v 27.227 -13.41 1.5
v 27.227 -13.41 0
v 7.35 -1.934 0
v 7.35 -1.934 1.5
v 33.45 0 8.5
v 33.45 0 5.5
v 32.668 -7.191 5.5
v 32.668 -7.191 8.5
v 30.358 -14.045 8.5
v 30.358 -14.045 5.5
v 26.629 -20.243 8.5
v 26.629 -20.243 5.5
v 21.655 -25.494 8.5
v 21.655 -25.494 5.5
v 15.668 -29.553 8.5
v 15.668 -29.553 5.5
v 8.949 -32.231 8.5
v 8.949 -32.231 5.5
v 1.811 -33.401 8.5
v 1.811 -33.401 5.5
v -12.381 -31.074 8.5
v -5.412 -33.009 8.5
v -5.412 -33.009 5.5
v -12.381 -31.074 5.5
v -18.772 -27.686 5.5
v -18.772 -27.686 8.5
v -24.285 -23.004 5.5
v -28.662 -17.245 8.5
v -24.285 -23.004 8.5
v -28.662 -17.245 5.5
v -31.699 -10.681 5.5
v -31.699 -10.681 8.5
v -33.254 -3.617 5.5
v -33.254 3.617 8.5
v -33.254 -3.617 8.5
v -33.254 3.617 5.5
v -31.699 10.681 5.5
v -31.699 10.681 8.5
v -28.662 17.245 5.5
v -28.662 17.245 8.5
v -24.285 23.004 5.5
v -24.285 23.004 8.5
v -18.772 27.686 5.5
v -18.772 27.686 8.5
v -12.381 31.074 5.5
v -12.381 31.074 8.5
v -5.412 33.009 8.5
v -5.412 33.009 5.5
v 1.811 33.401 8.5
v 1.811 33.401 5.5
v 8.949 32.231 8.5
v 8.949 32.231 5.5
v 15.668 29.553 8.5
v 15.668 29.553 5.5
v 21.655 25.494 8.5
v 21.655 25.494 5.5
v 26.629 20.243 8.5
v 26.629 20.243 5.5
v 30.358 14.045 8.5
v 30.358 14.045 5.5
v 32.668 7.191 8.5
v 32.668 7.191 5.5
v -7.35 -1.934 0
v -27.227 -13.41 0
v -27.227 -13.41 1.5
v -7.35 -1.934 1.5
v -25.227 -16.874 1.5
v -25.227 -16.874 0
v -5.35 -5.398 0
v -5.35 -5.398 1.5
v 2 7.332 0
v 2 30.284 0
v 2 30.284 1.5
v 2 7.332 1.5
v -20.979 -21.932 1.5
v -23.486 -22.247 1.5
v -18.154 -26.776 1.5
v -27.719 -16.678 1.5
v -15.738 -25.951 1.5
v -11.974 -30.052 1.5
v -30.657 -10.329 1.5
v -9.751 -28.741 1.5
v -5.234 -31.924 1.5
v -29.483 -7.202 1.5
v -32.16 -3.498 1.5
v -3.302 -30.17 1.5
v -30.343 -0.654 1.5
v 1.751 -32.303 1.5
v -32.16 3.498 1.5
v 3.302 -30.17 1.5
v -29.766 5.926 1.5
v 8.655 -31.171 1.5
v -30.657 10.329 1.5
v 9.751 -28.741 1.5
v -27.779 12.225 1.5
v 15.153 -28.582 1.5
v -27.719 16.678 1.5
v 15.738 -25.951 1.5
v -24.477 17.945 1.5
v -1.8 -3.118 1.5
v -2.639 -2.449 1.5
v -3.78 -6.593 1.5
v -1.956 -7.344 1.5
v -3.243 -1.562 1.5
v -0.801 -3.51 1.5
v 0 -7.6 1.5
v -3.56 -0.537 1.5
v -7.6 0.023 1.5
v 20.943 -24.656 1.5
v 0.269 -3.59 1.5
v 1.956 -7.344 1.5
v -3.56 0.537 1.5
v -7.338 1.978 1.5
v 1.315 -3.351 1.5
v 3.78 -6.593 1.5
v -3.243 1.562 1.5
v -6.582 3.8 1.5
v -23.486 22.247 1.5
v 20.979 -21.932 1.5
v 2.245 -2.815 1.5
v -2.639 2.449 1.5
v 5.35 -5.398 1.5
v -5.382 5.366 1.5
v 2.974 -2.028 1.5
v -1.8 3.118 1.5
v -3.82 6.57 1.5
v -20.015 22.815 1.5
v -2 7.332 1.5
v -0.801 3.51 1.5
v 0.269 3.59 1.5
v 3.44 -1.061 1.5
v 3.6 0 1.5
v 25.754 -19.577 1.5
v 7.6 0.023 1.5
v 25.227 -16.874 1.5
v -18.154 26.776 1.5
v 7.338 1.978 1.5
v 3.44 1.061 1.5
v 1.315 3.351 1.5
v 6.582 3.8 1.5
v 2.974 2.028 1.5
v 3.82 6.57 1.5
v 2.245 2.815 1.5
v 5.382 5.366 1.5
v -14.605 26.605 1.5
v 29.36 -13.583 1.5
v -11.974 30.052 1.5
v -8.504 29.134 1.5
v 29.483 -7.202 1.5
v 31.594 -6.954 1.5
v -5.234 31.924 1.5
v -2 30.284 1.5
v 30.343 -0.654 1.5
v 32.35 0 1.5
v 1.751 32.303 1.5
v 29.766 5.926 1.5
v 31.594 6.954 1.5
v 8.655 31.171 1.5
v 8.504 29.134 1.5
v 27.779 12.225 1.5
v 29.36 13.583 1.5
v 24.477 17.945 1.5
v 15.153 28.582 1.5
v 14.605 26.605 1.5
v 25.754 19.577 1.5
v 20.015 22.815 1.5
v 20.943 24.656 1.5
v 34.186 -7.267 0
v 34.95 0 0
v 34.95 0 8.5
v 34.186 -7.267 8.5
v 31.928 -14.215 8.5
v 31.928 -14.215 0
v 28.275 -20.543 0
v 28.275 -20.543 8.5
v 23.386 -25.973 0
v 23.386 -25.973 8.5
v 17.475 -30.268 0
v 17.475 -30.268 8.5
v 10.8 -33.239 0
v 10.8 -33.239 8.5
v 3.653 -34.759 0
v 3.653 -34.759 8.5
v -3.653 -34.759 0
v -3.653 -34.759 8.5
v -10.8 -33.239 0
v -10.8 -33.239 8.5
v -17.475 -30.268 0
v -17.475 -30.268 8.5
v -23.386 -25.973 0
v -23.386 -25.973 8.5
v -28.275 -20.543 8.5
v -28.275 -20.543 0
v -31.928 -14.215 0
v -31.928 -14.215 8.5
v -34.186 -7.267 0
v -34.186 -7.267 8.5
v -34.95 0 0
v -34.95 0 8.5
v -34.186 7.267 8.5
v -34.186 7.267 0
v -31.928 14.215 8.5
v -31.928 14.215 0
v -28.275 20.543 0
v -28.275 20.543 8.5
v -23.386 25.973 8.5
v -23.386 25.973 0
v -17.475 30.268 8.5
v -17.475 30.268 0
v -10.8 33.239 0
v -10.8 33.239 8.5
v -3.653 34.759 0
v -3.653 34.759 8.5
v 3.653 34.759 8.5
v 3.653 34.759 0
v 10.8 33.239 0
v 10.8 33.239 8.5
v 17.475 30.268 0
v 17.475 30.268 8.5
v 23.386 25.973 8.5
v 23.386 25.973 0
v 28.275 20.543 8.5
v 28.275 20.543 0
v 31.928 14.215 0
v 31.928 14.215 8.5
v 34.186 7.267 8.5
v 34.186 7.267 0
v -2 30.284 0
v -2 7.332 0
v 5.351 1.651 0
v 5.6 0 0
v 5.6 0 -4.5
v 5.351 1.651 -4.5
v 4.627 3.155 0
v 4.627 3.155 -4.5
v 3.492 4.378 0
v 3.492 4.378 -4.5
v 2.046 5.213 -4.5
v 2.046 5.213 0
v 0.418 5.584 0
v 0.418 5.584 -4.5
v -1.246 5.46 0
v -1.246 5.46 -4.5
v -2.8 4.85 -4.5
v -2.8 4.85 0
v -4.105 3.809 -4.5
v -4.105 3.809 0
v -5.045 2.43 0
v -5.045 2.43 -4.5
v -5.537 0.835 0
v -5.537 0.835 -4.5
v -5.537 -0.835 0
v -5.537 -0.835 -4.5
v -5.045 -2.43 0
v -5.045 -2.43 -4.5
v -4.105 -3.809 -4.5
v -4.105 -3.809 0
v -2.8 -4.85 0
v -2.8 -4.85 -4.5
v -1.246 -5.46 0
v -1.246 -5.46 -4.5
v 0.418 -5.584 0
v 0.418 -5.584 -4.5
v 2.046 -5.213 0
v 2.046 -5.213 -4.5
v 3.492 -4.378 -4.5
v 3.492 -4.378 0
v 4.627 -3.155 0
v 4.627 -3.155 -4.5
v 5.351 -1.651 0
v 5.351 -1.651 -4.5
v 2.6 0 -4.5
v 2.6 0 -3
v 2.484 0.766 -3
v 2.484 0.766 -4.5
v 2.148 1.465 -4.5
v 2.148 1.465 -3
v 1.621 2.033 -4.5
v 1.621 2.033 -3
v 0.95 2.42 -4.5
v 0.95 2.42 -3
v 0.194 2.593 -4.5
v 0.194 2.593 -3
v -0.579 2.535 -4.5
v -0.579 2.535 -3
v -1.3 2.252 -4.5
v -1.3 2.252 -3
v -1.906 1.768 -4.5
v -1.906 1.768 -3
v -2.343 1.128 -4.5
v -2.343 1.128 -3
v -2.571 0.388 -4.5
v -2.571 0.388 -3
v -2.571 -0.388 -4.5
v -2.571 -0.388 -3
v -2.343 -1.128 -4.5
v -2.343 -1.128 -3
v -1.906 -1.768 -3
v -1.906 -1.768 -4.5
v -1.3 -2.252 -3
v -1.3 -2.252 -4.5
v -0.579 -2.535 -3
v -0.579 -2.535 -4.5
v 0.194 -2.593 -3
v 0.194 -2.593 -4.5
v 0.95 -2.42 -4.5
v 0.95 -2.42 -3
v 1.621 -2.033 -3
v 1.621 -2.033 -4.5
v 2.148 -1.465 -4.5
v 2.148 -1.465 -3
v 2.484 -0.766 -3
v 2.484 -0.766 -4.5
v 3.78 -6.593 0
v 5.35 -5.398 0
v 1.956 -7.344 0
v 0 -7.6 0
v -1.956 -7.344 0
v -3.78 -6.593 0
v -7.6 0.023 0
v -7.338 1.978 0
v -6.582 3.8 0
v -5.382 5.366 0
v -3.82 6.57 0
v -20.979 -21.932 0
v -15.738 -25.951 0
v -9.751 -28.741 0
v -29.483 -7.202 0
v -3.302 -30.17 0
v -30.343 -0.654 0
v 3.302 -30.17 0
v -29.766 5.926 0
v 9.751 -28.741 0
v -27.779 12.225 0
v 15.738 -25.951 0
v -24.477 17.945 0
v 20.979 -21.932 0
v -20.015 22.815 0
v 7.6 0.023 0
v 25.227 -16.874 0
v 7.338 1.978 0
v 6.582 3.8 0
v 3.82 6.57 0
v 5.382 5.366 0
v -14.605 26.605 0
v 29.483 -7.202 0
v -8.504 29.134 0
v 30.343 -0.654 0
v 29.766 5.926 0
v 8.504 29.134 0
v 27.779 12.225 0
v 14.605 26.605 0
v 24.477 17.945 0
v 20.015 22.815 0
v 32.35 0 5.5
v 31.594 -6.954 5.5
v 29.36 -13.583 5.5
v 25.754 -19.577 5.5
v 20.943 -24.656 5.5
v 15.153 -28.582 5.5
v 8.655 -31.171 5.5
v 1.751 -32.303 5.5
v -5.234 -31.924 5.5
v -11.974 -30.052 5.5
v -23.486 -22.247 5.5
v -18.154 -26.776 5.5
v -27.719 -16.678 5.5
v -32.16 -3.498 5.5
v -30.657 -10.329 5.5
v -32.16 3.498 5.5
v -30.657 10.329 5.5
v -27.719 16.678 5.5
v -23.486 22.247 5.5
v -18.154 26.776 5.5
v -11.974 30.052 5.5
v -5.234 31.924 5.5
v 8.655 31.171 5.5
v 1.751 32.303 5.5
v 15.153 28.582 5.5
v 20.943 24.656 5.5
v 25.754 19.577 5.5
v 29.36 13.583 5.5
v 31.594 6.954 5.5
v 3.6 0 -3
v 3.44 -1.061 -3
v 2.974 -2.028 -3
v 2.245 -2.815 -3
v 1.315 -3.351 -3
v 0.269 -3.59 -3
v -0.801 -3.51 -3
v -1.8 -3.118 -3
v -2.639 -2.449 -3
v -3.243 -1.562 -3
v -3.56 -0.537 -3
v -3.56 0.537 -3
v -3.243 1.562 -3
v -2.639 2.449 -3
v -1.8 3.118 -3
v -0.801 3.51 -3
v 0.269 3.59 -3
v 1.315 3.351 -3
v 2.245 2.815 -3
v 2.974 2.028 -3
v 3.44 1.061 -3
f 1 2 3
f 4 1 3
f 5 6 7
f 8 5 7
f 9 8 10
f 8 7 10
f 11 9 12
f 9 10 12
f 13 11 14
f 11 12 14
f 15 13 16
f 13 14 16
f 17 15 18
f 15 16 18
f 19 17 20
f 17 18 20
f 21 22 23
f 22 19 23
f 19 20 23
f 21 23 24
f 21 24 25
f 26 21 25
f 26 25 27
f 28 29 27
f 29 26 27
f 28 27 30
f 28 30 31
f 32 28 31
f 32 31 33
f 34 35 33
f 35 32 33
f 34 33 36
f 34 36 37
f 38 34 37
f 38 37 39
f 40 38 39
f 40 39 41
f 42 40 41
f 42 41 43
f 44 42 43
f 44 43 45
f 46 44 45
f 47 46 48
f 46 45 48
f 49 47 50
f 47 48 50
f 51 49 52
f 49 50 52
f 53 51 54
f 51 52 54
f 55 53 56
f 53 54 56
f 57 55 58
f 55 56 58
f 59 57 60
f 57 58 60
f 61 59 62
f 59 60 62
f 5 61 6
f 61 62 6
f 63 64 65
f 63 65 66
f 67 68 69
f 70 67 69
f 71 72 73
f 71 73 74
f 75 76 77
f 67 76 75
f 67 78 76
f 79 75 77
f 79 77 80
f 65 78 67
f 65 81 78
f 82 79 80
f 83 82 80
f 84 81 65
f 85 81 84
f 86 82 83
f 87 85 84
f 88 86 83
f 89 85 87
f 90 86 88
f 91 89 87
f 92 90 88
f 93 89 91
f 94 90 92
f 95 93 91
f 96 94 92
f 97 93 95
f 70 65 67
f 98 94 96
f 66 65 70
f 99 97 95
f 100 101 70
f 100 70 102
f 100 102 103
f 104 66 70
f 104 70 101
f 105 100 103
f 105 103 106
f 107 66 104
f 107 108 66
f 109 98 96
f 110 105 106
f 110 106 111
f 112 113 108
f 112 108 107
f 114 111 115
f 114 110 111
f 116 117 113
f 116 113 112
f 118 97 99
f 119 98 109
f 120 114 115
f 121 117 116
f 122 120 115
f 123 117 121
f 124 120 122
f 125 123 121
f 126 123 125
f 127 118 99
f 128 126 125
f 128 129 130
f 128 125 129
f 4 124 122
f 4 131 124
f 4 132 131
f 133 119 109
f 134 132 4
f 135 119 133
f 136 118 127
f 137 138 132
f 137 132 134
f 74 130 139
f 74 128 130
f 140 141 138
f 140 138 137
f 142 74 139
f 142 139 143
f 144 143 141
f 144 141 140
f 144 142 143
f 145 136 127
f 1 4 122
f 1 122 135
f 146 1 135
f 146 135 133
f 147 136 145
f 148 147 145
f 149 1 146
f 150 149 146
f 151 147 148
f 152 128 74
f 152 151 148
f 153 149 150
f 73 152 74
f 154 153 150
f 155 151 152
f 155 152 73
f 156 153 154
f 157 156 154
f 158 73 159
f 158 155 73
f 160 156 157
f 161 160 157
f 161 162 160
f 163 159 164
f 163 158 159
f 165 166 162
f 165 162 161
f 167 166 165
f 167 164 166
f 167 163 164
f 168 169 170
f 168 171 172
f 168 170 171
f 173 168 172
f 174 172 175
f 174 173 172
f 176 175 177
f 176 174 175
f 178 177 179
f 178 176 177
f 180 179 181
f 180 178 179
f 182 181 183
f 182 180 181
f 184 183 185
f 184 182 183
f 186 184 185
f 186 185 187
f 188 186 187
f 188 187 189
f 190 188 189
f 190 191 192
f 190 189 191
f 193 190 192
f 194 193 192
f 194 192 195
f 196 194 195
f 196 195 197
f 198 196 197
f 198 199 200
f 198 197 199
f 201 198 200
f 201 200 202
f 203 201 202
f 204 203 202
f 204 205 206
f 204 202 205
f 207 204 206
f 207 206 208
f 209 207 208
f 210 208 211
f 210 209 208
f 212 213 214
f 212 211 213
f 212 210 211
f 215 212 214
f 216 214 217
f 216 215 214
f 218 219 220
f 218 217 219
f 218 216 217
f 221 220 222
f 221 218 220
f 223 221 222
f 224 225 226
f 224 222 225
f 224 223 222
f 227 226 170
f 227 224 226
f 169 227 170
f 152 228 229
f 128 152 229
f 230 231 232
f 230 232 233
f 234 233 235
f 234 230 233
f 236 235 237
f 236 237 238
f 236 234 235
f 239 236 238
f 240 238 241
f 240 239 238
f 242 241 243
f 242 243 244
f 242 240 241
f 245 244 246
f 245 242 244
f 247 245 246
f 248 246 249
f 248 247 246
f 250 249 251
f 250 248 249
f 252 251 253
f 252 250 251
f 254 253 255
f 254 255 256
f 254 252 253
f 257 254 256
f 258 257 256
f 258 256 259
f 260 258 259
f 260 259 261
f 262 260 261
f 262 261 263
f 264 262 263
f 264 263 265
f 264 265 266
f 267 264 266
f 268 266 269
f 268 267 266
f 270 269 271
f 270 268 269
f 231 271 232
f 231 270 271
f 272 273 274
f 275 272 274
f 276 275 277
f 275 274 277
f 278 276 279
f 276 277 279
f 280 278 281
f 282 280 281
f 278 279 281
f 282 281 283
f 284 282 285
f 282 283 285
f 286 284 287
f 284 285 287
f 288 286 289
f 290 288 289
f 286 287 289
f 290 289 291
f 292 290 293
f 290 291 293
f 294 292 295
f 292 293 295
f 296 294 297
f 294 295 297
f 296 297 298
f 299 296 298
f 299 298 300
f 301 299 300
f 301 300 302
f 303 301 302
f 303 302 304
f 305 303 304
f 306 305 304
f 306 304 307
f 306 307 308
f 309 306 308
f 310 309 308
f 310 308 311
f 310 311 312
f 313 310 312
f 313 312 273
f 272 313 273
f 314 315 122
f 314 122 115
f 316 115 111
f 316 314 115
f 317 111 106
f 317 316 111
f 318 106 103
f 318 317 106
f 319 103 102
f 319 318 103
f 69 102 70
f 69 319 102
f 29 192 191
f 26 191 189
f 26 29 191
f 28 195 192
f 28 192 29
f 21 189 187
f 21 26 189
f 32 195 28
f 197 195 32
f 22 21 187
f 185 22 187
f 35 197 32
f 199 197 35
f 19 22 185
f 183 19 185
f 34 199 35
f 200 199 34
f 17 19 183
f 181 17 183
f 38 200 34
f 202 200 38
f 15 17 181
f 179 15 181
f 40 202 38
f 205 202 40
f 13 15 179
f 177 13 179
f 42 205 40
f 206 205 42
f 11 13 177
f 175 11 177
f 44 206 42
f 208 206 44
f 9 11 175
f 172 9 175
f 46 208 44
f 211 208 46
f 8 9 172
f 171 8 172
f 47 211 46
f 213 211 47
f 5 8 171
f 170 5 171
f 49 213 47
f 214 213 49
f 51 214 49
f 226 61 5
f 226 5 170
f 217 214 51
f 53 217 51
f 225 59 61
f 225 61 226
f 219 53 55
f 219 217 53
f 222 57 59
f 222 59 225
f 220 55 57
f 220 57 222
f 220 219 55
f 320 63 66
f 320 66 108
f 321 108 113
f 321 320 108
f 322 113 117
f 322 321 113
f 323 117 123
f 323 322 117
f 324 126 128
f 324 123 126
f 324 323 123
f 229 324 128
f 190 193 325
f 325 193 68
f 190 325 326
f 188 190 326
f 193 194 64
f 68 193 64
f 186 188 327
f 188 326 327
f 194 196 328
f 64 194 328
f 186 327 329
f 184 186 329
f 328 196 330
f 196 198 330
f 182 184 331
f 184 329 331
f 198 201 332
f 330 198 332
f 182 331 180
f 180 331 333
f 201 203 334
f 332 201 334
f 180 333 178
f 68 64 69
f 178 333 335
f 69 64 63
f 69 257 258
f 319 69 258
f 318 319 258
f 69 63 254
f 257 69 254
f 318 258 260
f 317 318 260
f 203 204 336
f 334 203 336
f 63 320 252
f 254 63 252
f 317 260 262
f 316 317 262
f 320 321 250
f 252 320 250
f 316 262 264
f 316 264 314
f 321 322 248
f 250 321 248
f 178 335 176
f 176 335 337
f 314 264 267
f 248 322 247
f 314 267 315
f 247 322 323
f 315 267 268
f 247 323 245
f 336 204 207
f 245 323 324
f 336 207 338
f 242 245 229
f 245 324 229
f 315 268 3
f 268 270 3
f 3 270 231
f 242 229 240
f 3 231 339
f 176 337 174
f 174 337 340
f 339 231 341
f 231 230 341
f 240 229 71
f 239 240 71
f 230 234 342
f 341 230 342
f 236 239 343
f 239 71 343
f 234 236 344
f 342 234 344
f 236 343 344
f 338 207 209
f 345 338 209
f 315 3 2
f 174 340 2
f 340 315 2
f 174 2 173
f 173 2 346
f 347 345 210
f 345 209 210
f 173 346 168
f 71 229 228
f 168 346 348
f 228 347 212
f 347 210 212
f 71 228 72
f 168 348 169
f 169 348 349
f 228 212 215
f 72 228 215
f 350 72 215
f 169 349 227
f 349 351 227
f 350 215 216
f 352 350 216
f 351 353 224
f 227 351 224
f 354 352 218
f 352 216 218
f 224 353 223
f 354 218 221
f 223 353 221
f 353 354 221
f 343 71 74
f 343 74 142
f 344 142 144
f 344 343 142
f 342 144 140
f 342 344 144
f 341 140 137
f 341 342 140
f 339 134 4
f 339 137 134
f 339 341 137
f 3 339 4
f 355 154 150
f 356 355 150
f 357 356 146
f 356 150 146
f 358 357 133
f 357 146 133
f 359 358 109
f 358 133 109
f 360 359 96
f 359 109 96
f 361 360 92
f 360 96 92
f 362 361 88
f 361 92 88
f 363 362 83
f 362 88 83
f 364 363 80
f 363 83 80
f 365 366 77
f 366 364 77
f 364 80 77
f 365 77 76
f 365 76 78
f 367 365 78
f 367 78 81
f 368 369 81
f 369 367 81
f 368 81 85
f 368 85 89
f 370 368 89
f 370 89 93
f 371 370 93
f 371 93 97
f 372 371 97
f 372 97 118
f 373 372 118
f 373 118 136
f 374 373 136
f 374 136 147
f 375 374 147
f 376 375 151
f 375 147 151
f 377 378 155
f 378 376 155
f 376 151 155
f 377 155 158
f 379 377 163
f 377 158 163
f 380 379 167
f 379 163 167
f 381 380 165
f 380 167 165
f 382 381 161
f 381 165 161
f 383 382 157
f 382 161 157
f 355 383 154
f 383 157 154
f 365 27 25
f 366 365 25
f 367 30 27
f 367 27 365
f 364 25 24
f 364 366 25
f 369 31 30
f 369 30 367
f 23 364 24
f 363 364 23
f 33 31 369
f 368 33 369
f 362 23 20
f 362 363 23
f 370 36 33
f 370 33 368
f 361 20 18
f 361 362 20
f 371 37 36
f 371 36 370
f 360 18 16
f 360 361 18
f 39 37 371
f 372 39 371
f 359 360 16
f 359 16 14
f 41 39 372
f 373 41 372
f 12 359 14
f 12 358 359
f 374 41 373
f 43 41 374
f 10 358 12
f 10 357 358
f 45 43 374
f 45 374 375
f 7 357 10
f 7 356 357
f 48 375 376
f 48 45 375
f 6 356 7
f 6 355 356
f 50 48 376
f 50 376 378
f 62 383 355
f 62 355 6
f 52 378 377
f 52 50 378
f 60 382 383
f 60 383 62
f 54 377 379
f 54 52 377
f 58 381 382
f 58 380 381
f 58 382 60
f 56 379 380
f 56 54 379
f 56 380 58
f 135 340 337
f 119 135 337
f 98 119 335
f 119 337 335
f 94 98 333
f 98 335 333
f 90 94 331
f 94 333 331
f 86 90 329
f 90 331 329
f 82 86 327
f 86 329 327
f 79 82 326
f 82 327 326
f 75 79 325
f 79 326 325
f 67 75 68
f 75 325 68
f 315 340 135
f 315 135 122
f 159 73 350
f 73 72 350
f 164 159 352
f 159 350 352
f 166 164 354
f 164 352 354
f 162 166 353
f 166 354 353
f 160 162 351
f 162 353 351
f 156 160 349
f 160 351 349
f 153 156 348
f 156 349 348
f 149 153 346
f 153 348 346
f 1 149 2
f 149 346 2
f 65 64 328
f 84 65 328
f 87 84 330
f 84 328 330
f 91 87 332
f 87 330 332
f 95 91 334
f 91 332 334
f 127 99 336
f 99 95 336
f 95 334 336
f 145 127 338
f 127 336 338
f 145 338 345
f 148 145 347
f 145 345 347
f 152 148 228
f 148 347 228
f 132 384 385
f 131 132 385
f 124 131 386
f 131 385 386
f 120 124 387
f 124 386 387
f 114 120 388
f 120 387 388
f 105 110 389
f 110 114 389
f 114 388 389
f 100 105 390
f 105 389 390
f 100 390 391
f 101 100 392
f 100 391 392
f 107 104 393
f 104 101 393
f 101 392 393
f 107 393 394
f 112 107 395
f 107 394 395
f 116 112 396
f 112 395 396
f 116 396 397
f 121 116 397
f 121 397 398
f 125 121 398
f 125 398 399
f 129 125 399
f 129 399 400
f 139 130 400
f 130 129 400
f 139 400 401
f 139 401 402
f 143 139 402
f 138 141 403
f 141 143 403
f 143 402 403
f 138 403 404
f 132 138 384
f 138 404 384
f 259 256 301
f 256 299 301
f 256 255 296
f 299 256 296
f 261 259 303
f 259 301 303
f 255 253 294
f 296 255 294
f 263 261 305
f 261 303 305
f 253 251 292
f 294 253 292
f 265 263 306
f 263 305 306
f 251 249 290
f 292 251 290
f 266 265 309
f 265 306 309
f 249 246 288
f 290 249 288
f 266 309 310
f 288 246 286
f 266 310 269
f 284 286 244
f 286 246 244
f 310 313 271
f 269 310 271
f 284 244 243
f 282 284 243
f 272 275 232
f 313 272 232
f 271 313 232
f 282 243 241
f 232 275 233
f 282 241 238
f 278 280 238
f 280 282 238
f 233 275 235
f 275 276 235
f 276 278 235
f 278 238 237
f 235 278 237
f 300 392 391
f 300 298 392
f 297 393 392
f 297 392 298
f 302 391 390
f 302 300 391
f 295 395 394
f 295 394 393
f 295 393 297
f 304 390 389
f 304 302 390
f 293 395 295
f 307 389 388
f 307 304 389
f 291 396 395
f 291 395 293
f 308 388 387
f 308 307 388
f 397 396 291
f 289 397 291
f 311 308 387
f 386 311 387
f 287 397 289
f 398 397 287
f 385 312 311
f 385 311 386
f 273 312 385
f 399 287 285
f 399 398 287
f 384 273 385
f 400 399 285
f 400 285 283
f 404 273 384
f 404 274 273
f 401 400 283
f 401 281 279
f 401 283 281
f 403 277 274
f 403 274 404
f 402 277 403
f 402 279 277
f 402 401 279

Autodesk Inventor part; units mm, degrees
ref_plane "YZ Plane" through (0, 0, 0) normal (1, 0, 0) x (0, 1, 0)
ref_plane "XZ Plane" through (0, 0, 0) normal (0, 1, 0) x (-1, 0, 0)
ref_plane "XY Plane" through (0, 0, 0) normal (0, 0, 1) x (1, 0, 0)
sketch "Skizze1" plane through (0, 0, 0) normal (0, 0, 1) x (1, 0, 0)
  circle A0 centre (0, 0) radius 33.35 construction
  circle A1 centre (0, 0) radius 34.95
  circle A2 centre (0, 0) radius 3.6
  circle A3 centre (0, 0) radius 5.6
  circle A4 centre (0, 0) radius 33.45
  circle A5 centre (0, 0) radius 2.6
  line L0 (0, 51.4164) -> (0, -49.3444) construction
  line L1 (-54.4561, 0) -> (54.4561, 0) construction
  line L2 (-2, 30.284) -> (-2, 7.3321)
  line L3 (0, 0) -> (-28.9685, 16.725) construction
  line L4 (-27.2267, -13.41) -> (-7.3498, -1.934)
  arc A6 (-2, 7.3321) -> (-7.3498, -1.934) centre (0, 0) ccw
  arc A7 (-2, 30.284) -> (-27.2267, -13.41) centre (0, 0) ccw
  line L5 (25.2267, -16.8741) -> (5.3498, -5.3981)
  arc A8 (-25.2267, -16.8741) -> (25.2267, -16.8741) centre (0, 0) ccw
  line L6 (-25.2267, -16.8741) -> (-5.3498, -5.3981)
  arc A9 (-5.3498, -5.3981) -> (5.3498, -5.3981) centre (0, 0) ccw
  line L7 (2, 30.284) -> (2, 7.3321)
  arc A10 (27.2267, -13.41) -> (2, 30.284) centre (0, 0) ccw
  line L8 (27.2267, -13.41) -> (7.3498, -1.934)
  arc A11 (7.3498, -1.934) -> (2, 7.3321) centre (0, 0) ccw
  circle A12 centre (0, 0) radius 32.35
  dimension "d1" = 33.35
  dimension "d2" = 7.2
  dimension "d3" = 2
  dimension "d4" = 0.1
  dimension "d5" = 1.5
  dimension "d12" = 1
  dimension "d17" = 60
  dimension "d18" = 2
  dimension "d19" = 3
  dimension "d20" = 2
  dimension "d23" = 360
  dimension "d25" = 1
extrude "Extrusion1" add sketch "Skizze1" along normal blind 1.5 contours A1 | A3 | A4 | A12
extrude "Extrusion2" add sketch "Skizze1" along normal blind 7 from surface at 1.5 contours A1
extrude "Extrusion3" add sketch "Skizze1" against normal blind 3 from surface at 0 contours A3
extrude "Extrusion4" add sketch "Skizze1" against normal blind 1.5 from surface at -3 contours A2 | A3
extrude "Extrusion5" add sketch "Skizze1" along normal blind 4 from surface at 1.5 contours A4
properties part number "ShaftHolder"
